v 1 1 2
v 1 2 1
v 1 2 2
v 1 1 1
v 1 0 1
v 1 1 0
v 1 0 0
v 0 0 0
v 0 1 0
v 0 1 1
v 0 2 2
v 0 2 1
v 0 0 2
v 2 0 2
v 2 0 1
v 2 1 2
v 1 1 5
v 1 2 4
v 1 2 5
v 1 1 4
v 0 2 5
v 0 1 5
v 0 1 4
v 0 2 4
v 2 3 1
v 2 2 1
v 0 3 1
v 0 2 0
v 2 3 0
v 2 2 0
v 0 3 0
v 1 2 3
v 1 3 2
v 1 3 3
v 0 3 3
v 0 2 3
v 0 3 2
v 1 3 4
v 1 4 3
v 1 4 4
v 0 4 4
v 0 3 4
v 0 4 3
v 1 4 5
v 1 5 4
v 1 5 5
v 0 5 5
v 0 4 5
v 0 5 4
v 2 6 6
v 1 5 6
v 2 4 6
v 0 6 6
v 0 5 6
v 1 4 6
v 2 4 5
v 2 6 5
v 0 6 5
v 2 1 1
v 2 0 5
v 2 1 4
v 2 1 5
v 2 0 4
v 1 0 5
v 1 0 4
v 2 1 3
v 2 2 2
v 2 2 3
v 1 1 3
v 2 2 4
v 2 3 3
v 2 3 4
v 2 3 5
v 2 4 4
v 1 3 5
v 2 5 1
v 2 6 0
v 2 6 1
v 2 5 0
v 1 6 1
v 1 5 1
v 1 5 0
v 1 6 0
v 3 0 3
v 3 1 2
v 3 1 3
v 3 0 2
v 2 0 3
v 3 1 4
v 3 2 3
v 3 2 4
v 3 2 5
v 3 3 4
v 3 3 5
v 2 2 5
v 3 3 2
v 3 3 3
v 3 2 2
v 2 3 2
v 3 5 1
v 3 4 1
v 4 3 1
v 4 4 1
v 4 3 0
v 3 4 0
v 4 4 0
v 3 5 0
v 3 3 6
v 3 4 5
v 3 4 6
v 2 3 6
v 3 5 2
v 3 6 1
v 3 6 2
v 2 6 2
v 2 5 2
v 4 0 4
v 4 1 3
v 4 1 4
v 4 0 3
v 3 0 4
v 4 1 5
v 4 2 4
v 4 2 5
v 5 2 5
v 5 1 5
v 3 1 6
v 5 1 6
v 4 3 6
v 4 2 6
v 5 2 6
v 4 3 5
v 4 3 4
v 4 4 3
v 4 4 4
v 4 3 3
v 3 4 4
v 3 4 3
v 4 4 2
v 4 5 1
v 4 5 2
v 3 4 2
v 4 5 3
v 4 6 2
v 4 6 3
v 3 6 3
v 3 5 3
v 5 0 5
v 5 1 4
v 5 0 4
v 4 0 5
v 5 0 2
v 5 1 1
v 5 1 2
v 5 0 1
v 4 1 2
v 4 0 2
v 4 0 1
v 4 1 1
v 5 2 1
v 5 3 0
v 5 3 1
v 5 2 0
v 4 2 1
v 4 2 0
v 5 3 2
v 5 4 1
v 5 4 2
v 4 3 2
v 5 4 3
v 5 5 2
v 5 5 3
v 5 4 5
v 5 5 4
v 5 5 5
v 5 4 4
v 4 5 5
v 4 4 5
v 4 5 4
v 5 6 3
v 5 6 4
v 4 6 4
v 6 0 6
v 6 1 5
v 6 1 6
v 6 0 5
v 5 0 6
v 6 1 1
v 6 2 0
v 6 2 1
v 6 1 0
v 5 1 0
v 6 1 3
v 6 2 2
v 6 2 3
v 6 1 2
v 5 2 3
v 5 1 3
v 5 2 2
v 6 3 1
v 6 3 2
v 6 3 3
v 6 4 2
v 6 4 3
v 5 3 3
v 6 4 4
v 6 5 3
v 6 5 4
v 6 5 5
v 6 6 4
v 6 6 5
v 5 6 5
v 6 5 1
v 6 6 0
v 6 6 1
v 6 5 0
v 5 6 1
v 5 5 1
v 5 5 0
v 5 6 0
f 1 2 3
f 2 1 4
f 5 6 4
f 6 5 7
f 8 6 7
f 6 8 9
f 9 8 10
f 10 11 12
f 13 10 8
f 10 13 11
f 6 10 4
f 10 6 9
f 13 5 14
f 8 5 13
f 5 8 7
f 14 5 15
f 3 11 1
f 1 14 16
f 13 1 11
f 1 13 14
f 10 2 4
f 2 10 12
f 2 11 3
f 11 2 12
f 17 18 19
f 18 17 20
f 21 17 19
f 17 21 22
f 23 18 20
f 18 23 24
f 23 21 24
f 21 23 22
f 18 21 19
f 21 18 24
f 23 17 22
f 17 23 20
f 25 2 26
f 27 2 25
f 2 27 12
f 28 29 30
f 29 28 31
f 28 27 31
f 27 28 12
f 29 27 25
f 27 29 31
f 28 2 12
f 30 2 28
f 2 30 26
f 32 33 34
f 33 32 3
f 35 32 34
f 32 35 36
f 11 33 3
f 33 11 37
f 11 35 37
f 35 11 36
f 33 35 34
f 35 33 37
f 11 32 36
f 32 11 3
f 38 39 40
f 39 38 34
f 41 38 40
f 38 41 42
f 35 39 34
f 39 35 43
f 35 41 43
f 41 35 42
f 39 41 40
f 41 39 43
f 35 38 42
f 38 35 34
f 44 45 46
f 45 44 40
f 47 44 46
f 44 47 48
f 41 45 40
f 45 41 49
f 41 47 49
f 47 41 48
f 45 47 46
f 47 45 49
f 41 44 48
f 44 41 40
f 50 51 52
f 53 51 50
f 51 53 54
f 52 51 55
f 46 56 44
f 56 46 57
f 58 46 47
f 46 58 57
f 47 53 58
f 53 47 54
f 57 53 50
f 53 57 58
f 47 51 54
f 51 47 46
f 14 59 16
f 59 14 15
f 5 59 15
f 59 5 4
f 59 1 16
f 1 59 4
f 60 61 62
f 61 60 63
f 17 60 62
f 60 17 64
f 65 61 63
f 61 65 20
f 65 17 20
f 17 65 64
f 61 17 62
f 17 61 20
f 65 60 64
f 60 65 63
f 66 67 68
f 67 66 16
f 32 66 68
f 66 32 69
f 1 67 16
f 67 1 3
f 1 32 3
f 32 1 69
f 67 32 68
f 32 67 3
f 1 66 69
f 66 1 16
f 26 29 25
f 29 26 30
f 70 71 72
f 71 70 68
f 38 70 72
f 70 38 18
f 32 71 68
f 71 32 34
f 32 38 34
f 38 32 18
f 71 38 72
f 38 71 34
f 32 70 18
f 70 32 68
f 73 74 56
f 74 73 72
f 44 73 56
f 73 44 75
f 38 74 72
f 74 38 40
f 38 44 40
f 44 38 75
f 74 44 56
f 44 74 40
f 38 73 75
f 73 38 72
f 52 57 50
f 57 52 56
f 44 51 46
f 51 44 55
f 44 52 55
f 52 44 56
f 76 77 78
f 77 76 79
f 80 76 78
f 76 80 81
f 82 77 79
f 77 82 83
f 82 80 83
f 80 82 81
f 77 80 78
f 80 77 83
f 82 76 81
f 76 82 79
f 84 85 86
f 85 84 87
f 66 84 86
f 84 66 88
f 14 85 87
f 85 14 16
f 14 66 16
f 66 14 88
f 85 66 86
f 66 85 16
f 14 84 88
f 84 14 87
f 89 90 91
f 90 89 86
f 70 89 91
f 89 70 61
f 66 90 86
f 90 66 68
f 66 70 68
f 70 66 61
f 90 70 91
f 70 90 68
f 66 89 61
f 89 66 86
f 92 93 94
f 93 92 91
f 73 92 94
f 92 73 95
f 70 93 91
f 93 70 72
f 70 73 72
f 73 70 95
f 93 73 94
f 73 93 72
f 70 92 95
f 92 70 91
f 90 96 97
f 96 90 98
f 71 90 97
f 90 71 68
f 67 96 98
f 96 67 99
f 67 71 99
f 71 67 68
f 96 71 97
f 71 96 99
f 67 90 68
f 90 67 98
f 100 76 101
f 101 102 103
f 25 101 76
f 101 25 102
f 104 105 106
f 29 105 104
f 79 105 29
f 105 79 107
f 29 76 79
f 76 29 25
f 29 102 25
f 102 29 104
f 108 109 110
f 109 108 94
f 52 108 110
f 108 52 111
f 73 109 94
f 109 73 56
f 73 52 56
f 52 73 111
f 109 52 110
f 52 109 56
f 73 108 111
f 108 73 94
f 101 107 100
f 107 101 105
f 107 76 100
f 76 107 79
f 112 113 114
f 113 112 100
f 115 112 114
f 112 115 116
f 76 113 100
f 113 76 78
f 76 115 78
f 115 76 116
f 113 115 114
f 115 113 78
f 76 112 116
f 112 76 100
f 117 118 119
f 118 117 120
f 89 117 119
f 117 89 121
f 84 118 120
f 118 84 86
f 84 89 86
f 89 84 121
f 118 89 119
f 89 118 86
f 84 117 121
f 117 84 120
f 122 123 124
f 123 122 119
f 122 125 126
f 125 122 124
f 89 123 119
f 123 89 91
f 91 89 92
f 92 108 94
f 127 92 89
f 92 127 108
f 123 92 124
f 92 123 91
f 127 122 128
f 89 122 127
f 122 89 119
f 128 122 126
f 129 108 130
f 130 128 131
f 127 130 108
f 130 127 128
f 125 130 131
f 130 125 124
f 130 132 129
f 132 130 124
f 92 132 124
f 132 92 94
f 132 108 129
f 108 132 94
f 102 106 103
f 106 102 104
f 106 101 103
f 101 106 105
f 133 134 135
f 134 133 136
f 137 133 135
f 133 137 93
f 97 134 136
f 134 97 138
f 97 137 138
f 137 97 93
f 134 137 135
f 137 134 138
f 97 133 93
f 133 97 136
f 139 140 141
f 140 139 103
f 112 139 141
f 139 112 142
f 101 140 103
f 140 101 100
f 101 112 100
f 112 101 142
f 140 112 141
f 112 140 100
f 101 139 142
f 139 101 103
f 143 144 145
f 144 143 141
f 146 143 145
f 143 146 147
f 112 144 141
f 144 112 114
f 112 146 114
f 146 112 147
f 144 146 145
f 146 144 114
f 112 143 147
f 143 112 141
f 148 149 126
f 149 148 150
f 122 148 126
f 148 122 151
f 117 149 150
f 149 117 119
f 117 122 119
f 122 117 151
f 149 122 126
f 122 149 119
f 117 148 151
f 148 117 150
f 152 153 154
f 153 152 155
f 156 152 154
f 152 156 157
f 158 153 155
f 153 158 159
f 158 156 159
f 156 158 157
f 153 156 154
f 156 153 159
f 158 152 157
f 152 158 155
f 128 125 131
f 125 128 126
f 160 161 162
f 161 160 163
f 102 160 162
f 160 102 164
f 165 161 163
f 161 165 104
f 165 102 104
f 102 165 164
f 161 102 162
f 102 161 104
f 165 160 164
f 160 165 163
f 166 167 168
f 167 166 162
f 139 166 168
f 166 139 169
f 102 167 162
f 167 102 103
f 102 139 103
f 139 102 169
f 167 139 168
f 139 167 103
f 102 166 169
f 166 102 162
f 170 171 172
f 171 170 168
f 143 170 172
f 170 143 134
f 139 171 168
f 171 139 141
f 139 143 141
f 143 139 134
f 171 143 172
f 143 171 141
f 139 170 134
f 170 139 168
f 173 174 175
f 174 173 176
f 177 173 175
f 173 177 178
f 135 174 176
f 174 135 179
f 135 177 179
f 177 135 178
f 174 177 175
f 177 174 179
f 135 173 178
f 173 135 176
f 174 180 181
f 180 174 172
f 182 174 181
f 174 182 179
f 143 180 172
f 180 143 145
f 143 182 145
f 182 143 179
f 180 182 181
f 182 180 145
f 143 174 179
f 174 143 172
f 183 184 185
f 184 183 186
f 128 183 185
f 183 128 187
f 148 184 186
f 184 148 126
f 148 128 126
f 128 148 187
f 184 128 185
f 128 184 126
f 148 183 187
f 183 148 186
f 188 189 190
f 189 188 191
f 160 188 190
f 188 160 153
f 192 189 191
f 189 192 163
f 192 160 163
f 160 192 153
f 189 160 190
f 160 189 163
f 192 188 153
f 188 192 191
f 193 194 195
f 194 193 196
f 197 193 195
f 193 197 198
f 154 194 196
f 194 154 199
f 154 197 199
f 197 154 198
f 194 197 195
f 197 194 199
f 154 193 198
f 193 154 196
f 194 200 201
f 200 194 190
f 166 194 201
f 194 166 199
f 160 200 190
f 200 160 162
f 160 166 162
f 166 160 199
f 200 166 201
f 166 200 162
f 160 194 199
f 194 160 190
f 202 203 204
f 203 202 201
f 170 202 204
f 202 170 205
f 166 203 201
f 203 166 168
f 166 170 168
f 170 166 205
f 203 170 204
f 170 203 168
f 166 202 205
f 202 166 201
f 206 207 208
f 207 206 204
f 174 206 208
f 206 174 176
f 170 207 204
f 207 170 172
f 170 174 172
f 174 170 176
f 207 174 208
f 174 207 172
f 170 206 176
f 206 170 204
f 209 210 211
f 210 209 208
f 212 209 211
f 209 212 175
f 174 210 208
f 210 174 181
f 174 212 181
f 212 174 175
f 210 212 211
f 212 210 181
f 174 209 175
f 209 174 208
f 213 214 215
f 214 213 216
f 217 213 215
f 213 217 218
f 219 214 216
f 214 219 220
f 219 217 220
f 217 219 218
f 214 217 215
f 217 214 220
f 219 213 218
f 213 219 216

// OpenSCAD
union() {
    translate([0, 0, 0]) cube([1, 1, 1]);
    translate([0, 0, 1]) cube([1, 1, 1]);
    translate([0, 1, 1]) cube([1, 1, 1]);
    translate([0, 1, 4]) cube([1, 1, 1]);
    translate([0, 2, 0]) cube([1, 1, 1]);
    translate([0, 2, 2]) cube([1, 1, 1]);
    translate([0, 3, 3]) cube([1, 1, 1]);
    translate([0, 4, 4]) cube([1, 1, 1]);
    translate([0, 5, 5]) cube([1, 1, 1]);
    translate([1, 0, 1]) cube([1, 1, 1]);
    translate([1, 0, 4]) cube([1, 1, 1]);
    translate([1, 1, 2]) cube([1, 1, 1]);
    translate([1, 2, 0]) cube([1, 1, 1]);
    translate([1, 2, 3]) cube([1, 1, 1]);
    translate([1, 3, 4]) cube([1, 1, 1]);
    translate([1, 4, 5]) cube([1, 1, 1]);
    translate([1, 5, 0]) cube([1, 1, 1]);
    translate([1, 5, 5]) cube([1, 1, 1]);
    translate([2, 0, 2]) cube([1, 1, 1]);
    translate([2, 1, 3]) cube([1, 1, 1]);
    translate([2, 2, 4]) cube([1, 1, 1]);
    translate([2, 2, 2]) cube([1, 1, 1]);
    translate([2, 3, 0]) cube([1, 1, 1]);
    translate([2, 3, 5]) cube([1, 1, 1]);
    translate([2, 4, 0]) cube([1, 1, 1]);
    translate([2, 5, 1]) cube([1, 1, 1]);
    translate([3, 0, 3]) cube([1, 1, 1]);
    translate([3, 1, 4]) cube([1, 1, 1]);
    translate([3, 1, 5]) cube([1, 1, 1]);
    translate([3, 2, 5]) cube([1, 1, 1]);
    translate([3, 3, 0]) cube([1, 1, 1]);
    translate([3, 3, 3]) cube([1, 1, 1]);
    translate([3, 4, 1]) cube([1, 1, 1]);
    translate([3, 5, 2]) cube([1, 1, 1]);
    translate([4, 0, 4]) cube([1, 1, 1]);
    translate([4, 0, 1]) cube([1, 1, 1]);
    translate([4, 1, 5]) cube([1, 1, 1]);
    translate([4, 2, 0]) cube([1, 1, 1]);
    translate([4, 3, 1]) cube([1, 1, 1]);
    translate([4, 4, 2]) cube([1, 1, 1]);
    translate([4, 4, 4]) cube([1, 1, 1]);
    translate([4, 5, 3]) cube([1, 1, 1]);
    translate([5, 0, 5]) cube([1, 1, 1]);
    translate([5, 1, 0]) cube([1, 1, 1]);
    translate([5, 1, 2]) cube([1, 1, 1]);
    translate([5, 2, 1]) cube([1, 1, 1]);
    translate([5, 3, 2]) cube([1, 1, 1]);
    translate([5, 4, 3]) cube([1, 1, 1]);
    translate([5, 5, 4]) cube([1, 1, 1]);
    translate([5, 5, 0]) cube([1, 1, 1]);
}
